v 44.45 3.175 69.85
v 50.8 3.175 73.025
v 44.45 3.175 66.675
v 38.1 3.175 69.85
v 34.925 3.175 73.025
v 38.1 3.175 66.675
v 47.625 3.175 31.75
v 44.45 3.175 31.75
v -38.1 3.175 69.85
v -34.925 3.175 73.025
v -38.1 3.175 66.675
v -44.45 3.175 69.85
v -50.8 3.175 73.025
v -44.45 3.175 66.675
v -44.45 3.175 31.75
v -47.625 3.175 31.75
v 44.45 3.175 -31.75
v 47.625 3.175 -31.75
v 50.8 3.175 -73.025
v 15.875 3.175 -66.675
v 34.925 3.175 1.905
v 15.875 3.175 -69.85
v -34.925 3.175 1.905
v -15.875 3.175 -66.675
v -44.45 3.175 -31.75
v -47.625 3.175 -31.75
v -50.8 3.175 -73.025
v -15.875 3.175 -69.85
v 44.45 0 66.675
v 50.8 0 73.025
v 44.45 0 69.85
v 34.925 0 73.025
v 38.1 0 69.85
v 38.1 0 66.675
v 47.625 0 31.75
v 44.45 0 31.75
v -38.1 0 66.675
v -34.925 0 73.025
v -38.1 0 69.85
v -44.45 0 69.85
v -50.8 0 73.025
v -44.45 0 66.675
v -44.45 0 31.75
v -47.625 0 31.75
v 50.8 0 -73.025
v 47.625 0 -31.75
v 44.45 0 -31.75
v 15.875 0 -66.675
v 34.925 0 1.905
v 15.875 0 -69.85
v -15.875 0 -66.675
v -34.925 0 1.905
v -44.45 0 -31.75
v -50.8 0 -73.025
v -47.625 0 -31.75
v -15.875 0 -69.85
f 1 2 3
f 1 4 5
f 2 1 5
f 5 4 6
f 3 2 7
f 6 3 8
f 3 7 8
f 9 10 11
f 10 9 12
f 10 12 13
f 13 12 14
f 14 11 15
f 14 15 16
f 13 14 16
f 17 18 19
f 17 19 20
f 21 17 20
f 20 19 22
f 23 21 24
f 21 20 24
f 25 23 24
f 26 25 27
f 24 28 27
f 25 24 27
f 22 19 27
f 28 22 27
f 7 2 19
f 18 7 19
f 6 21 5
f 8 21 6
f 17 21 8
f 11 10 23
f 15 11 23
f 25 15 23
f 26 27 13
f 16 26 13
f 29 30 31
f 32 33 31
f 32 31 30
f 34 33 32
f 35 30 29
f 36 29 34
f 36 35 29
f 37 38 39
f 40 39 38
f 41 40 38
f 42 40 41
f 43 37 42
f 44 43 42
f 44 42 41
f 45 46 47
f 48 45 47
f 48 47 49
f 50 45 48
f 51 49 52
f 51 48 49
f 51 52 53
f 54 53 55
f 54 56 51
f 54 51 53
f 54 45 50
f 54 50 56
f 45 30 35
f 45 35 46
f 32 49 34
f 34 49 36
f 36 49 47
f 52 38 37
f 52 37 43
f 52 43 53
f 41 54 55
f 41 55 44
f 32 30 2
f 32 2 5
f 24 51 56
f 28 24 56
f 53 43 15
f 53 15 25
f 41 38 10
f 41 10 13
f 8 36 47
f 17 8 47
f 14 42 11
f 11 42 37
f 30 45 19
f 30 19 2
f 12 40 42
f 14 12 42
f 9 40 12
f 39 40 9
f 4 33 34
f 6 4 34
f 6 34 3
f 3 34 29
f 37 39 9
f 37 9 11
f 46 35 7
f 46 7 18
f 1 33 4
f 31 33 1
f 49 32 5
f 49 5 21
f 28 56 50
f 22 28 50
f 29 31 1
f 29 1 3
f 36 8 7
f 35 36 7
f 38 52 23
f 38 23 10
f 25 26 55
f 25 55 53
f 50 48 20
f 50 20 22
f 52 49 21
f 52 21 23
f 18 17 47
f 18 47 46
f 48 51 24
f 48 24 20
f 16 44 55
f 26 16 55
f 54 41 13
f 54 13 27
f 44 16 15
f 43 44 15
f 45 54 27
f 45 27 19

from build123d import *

# Parameters (mm, degrees)
SKETCH1_W           = 31.75
SKETCH1_H           = 3.175
SKETCH1_W_2         = 3.175
SKETCH1_H_2         = 63.5
SKETCH1_W_3         = 6.35
BOSS_EXTRUDE1_DEPTH = 3.175


with BuildPart() as part:
    # Sketch1 → Boss-Extrude1 (new body)
    with BuildSketch(Plane(origin=(0, 0, 0), x_dir=(1, 0, 0), z_dir=(0, 1, 0))):
        Polygon((-50.8, 73.025), (50.8, 73.025), (50.8, -73.025), (34.925, -73.025), (34.925, -1.905), (-34.925, -1.905), (-34.925, -73.025), (-50.8, -73.025), align=None)
        with Locations((0, 68.2625)):
            Rectangle(SKETCH1_W, SKETCH1_H, mode=Mode.SUBTRACT)
        with Locations((-46.0375, 0)):
            Rectangle(SKETCH1_W_2, SKETCH1_H_2, mode=Mode.SUBTRACT)
        with Locations((46.0375, 0)):
            Rectangle(SKETCH1_W_2, SKETCH1_H_2, mode=Mode.SUBTRACT)
        with Locations((-41.275, -68.2625)):
            Rectangle(SKETCH1_W_3, SKETCH1_H, mode=Mode.SUBTRACT)
        with Locations((41.275, -68.2625)):
            Rectangle(SKETCH1_W_3, SKETCH1_H, mode=Mode.SUBTRACT)
    extrude(amount=BOSS_EXTRUDE1_DEPTH)


solid = part.part
